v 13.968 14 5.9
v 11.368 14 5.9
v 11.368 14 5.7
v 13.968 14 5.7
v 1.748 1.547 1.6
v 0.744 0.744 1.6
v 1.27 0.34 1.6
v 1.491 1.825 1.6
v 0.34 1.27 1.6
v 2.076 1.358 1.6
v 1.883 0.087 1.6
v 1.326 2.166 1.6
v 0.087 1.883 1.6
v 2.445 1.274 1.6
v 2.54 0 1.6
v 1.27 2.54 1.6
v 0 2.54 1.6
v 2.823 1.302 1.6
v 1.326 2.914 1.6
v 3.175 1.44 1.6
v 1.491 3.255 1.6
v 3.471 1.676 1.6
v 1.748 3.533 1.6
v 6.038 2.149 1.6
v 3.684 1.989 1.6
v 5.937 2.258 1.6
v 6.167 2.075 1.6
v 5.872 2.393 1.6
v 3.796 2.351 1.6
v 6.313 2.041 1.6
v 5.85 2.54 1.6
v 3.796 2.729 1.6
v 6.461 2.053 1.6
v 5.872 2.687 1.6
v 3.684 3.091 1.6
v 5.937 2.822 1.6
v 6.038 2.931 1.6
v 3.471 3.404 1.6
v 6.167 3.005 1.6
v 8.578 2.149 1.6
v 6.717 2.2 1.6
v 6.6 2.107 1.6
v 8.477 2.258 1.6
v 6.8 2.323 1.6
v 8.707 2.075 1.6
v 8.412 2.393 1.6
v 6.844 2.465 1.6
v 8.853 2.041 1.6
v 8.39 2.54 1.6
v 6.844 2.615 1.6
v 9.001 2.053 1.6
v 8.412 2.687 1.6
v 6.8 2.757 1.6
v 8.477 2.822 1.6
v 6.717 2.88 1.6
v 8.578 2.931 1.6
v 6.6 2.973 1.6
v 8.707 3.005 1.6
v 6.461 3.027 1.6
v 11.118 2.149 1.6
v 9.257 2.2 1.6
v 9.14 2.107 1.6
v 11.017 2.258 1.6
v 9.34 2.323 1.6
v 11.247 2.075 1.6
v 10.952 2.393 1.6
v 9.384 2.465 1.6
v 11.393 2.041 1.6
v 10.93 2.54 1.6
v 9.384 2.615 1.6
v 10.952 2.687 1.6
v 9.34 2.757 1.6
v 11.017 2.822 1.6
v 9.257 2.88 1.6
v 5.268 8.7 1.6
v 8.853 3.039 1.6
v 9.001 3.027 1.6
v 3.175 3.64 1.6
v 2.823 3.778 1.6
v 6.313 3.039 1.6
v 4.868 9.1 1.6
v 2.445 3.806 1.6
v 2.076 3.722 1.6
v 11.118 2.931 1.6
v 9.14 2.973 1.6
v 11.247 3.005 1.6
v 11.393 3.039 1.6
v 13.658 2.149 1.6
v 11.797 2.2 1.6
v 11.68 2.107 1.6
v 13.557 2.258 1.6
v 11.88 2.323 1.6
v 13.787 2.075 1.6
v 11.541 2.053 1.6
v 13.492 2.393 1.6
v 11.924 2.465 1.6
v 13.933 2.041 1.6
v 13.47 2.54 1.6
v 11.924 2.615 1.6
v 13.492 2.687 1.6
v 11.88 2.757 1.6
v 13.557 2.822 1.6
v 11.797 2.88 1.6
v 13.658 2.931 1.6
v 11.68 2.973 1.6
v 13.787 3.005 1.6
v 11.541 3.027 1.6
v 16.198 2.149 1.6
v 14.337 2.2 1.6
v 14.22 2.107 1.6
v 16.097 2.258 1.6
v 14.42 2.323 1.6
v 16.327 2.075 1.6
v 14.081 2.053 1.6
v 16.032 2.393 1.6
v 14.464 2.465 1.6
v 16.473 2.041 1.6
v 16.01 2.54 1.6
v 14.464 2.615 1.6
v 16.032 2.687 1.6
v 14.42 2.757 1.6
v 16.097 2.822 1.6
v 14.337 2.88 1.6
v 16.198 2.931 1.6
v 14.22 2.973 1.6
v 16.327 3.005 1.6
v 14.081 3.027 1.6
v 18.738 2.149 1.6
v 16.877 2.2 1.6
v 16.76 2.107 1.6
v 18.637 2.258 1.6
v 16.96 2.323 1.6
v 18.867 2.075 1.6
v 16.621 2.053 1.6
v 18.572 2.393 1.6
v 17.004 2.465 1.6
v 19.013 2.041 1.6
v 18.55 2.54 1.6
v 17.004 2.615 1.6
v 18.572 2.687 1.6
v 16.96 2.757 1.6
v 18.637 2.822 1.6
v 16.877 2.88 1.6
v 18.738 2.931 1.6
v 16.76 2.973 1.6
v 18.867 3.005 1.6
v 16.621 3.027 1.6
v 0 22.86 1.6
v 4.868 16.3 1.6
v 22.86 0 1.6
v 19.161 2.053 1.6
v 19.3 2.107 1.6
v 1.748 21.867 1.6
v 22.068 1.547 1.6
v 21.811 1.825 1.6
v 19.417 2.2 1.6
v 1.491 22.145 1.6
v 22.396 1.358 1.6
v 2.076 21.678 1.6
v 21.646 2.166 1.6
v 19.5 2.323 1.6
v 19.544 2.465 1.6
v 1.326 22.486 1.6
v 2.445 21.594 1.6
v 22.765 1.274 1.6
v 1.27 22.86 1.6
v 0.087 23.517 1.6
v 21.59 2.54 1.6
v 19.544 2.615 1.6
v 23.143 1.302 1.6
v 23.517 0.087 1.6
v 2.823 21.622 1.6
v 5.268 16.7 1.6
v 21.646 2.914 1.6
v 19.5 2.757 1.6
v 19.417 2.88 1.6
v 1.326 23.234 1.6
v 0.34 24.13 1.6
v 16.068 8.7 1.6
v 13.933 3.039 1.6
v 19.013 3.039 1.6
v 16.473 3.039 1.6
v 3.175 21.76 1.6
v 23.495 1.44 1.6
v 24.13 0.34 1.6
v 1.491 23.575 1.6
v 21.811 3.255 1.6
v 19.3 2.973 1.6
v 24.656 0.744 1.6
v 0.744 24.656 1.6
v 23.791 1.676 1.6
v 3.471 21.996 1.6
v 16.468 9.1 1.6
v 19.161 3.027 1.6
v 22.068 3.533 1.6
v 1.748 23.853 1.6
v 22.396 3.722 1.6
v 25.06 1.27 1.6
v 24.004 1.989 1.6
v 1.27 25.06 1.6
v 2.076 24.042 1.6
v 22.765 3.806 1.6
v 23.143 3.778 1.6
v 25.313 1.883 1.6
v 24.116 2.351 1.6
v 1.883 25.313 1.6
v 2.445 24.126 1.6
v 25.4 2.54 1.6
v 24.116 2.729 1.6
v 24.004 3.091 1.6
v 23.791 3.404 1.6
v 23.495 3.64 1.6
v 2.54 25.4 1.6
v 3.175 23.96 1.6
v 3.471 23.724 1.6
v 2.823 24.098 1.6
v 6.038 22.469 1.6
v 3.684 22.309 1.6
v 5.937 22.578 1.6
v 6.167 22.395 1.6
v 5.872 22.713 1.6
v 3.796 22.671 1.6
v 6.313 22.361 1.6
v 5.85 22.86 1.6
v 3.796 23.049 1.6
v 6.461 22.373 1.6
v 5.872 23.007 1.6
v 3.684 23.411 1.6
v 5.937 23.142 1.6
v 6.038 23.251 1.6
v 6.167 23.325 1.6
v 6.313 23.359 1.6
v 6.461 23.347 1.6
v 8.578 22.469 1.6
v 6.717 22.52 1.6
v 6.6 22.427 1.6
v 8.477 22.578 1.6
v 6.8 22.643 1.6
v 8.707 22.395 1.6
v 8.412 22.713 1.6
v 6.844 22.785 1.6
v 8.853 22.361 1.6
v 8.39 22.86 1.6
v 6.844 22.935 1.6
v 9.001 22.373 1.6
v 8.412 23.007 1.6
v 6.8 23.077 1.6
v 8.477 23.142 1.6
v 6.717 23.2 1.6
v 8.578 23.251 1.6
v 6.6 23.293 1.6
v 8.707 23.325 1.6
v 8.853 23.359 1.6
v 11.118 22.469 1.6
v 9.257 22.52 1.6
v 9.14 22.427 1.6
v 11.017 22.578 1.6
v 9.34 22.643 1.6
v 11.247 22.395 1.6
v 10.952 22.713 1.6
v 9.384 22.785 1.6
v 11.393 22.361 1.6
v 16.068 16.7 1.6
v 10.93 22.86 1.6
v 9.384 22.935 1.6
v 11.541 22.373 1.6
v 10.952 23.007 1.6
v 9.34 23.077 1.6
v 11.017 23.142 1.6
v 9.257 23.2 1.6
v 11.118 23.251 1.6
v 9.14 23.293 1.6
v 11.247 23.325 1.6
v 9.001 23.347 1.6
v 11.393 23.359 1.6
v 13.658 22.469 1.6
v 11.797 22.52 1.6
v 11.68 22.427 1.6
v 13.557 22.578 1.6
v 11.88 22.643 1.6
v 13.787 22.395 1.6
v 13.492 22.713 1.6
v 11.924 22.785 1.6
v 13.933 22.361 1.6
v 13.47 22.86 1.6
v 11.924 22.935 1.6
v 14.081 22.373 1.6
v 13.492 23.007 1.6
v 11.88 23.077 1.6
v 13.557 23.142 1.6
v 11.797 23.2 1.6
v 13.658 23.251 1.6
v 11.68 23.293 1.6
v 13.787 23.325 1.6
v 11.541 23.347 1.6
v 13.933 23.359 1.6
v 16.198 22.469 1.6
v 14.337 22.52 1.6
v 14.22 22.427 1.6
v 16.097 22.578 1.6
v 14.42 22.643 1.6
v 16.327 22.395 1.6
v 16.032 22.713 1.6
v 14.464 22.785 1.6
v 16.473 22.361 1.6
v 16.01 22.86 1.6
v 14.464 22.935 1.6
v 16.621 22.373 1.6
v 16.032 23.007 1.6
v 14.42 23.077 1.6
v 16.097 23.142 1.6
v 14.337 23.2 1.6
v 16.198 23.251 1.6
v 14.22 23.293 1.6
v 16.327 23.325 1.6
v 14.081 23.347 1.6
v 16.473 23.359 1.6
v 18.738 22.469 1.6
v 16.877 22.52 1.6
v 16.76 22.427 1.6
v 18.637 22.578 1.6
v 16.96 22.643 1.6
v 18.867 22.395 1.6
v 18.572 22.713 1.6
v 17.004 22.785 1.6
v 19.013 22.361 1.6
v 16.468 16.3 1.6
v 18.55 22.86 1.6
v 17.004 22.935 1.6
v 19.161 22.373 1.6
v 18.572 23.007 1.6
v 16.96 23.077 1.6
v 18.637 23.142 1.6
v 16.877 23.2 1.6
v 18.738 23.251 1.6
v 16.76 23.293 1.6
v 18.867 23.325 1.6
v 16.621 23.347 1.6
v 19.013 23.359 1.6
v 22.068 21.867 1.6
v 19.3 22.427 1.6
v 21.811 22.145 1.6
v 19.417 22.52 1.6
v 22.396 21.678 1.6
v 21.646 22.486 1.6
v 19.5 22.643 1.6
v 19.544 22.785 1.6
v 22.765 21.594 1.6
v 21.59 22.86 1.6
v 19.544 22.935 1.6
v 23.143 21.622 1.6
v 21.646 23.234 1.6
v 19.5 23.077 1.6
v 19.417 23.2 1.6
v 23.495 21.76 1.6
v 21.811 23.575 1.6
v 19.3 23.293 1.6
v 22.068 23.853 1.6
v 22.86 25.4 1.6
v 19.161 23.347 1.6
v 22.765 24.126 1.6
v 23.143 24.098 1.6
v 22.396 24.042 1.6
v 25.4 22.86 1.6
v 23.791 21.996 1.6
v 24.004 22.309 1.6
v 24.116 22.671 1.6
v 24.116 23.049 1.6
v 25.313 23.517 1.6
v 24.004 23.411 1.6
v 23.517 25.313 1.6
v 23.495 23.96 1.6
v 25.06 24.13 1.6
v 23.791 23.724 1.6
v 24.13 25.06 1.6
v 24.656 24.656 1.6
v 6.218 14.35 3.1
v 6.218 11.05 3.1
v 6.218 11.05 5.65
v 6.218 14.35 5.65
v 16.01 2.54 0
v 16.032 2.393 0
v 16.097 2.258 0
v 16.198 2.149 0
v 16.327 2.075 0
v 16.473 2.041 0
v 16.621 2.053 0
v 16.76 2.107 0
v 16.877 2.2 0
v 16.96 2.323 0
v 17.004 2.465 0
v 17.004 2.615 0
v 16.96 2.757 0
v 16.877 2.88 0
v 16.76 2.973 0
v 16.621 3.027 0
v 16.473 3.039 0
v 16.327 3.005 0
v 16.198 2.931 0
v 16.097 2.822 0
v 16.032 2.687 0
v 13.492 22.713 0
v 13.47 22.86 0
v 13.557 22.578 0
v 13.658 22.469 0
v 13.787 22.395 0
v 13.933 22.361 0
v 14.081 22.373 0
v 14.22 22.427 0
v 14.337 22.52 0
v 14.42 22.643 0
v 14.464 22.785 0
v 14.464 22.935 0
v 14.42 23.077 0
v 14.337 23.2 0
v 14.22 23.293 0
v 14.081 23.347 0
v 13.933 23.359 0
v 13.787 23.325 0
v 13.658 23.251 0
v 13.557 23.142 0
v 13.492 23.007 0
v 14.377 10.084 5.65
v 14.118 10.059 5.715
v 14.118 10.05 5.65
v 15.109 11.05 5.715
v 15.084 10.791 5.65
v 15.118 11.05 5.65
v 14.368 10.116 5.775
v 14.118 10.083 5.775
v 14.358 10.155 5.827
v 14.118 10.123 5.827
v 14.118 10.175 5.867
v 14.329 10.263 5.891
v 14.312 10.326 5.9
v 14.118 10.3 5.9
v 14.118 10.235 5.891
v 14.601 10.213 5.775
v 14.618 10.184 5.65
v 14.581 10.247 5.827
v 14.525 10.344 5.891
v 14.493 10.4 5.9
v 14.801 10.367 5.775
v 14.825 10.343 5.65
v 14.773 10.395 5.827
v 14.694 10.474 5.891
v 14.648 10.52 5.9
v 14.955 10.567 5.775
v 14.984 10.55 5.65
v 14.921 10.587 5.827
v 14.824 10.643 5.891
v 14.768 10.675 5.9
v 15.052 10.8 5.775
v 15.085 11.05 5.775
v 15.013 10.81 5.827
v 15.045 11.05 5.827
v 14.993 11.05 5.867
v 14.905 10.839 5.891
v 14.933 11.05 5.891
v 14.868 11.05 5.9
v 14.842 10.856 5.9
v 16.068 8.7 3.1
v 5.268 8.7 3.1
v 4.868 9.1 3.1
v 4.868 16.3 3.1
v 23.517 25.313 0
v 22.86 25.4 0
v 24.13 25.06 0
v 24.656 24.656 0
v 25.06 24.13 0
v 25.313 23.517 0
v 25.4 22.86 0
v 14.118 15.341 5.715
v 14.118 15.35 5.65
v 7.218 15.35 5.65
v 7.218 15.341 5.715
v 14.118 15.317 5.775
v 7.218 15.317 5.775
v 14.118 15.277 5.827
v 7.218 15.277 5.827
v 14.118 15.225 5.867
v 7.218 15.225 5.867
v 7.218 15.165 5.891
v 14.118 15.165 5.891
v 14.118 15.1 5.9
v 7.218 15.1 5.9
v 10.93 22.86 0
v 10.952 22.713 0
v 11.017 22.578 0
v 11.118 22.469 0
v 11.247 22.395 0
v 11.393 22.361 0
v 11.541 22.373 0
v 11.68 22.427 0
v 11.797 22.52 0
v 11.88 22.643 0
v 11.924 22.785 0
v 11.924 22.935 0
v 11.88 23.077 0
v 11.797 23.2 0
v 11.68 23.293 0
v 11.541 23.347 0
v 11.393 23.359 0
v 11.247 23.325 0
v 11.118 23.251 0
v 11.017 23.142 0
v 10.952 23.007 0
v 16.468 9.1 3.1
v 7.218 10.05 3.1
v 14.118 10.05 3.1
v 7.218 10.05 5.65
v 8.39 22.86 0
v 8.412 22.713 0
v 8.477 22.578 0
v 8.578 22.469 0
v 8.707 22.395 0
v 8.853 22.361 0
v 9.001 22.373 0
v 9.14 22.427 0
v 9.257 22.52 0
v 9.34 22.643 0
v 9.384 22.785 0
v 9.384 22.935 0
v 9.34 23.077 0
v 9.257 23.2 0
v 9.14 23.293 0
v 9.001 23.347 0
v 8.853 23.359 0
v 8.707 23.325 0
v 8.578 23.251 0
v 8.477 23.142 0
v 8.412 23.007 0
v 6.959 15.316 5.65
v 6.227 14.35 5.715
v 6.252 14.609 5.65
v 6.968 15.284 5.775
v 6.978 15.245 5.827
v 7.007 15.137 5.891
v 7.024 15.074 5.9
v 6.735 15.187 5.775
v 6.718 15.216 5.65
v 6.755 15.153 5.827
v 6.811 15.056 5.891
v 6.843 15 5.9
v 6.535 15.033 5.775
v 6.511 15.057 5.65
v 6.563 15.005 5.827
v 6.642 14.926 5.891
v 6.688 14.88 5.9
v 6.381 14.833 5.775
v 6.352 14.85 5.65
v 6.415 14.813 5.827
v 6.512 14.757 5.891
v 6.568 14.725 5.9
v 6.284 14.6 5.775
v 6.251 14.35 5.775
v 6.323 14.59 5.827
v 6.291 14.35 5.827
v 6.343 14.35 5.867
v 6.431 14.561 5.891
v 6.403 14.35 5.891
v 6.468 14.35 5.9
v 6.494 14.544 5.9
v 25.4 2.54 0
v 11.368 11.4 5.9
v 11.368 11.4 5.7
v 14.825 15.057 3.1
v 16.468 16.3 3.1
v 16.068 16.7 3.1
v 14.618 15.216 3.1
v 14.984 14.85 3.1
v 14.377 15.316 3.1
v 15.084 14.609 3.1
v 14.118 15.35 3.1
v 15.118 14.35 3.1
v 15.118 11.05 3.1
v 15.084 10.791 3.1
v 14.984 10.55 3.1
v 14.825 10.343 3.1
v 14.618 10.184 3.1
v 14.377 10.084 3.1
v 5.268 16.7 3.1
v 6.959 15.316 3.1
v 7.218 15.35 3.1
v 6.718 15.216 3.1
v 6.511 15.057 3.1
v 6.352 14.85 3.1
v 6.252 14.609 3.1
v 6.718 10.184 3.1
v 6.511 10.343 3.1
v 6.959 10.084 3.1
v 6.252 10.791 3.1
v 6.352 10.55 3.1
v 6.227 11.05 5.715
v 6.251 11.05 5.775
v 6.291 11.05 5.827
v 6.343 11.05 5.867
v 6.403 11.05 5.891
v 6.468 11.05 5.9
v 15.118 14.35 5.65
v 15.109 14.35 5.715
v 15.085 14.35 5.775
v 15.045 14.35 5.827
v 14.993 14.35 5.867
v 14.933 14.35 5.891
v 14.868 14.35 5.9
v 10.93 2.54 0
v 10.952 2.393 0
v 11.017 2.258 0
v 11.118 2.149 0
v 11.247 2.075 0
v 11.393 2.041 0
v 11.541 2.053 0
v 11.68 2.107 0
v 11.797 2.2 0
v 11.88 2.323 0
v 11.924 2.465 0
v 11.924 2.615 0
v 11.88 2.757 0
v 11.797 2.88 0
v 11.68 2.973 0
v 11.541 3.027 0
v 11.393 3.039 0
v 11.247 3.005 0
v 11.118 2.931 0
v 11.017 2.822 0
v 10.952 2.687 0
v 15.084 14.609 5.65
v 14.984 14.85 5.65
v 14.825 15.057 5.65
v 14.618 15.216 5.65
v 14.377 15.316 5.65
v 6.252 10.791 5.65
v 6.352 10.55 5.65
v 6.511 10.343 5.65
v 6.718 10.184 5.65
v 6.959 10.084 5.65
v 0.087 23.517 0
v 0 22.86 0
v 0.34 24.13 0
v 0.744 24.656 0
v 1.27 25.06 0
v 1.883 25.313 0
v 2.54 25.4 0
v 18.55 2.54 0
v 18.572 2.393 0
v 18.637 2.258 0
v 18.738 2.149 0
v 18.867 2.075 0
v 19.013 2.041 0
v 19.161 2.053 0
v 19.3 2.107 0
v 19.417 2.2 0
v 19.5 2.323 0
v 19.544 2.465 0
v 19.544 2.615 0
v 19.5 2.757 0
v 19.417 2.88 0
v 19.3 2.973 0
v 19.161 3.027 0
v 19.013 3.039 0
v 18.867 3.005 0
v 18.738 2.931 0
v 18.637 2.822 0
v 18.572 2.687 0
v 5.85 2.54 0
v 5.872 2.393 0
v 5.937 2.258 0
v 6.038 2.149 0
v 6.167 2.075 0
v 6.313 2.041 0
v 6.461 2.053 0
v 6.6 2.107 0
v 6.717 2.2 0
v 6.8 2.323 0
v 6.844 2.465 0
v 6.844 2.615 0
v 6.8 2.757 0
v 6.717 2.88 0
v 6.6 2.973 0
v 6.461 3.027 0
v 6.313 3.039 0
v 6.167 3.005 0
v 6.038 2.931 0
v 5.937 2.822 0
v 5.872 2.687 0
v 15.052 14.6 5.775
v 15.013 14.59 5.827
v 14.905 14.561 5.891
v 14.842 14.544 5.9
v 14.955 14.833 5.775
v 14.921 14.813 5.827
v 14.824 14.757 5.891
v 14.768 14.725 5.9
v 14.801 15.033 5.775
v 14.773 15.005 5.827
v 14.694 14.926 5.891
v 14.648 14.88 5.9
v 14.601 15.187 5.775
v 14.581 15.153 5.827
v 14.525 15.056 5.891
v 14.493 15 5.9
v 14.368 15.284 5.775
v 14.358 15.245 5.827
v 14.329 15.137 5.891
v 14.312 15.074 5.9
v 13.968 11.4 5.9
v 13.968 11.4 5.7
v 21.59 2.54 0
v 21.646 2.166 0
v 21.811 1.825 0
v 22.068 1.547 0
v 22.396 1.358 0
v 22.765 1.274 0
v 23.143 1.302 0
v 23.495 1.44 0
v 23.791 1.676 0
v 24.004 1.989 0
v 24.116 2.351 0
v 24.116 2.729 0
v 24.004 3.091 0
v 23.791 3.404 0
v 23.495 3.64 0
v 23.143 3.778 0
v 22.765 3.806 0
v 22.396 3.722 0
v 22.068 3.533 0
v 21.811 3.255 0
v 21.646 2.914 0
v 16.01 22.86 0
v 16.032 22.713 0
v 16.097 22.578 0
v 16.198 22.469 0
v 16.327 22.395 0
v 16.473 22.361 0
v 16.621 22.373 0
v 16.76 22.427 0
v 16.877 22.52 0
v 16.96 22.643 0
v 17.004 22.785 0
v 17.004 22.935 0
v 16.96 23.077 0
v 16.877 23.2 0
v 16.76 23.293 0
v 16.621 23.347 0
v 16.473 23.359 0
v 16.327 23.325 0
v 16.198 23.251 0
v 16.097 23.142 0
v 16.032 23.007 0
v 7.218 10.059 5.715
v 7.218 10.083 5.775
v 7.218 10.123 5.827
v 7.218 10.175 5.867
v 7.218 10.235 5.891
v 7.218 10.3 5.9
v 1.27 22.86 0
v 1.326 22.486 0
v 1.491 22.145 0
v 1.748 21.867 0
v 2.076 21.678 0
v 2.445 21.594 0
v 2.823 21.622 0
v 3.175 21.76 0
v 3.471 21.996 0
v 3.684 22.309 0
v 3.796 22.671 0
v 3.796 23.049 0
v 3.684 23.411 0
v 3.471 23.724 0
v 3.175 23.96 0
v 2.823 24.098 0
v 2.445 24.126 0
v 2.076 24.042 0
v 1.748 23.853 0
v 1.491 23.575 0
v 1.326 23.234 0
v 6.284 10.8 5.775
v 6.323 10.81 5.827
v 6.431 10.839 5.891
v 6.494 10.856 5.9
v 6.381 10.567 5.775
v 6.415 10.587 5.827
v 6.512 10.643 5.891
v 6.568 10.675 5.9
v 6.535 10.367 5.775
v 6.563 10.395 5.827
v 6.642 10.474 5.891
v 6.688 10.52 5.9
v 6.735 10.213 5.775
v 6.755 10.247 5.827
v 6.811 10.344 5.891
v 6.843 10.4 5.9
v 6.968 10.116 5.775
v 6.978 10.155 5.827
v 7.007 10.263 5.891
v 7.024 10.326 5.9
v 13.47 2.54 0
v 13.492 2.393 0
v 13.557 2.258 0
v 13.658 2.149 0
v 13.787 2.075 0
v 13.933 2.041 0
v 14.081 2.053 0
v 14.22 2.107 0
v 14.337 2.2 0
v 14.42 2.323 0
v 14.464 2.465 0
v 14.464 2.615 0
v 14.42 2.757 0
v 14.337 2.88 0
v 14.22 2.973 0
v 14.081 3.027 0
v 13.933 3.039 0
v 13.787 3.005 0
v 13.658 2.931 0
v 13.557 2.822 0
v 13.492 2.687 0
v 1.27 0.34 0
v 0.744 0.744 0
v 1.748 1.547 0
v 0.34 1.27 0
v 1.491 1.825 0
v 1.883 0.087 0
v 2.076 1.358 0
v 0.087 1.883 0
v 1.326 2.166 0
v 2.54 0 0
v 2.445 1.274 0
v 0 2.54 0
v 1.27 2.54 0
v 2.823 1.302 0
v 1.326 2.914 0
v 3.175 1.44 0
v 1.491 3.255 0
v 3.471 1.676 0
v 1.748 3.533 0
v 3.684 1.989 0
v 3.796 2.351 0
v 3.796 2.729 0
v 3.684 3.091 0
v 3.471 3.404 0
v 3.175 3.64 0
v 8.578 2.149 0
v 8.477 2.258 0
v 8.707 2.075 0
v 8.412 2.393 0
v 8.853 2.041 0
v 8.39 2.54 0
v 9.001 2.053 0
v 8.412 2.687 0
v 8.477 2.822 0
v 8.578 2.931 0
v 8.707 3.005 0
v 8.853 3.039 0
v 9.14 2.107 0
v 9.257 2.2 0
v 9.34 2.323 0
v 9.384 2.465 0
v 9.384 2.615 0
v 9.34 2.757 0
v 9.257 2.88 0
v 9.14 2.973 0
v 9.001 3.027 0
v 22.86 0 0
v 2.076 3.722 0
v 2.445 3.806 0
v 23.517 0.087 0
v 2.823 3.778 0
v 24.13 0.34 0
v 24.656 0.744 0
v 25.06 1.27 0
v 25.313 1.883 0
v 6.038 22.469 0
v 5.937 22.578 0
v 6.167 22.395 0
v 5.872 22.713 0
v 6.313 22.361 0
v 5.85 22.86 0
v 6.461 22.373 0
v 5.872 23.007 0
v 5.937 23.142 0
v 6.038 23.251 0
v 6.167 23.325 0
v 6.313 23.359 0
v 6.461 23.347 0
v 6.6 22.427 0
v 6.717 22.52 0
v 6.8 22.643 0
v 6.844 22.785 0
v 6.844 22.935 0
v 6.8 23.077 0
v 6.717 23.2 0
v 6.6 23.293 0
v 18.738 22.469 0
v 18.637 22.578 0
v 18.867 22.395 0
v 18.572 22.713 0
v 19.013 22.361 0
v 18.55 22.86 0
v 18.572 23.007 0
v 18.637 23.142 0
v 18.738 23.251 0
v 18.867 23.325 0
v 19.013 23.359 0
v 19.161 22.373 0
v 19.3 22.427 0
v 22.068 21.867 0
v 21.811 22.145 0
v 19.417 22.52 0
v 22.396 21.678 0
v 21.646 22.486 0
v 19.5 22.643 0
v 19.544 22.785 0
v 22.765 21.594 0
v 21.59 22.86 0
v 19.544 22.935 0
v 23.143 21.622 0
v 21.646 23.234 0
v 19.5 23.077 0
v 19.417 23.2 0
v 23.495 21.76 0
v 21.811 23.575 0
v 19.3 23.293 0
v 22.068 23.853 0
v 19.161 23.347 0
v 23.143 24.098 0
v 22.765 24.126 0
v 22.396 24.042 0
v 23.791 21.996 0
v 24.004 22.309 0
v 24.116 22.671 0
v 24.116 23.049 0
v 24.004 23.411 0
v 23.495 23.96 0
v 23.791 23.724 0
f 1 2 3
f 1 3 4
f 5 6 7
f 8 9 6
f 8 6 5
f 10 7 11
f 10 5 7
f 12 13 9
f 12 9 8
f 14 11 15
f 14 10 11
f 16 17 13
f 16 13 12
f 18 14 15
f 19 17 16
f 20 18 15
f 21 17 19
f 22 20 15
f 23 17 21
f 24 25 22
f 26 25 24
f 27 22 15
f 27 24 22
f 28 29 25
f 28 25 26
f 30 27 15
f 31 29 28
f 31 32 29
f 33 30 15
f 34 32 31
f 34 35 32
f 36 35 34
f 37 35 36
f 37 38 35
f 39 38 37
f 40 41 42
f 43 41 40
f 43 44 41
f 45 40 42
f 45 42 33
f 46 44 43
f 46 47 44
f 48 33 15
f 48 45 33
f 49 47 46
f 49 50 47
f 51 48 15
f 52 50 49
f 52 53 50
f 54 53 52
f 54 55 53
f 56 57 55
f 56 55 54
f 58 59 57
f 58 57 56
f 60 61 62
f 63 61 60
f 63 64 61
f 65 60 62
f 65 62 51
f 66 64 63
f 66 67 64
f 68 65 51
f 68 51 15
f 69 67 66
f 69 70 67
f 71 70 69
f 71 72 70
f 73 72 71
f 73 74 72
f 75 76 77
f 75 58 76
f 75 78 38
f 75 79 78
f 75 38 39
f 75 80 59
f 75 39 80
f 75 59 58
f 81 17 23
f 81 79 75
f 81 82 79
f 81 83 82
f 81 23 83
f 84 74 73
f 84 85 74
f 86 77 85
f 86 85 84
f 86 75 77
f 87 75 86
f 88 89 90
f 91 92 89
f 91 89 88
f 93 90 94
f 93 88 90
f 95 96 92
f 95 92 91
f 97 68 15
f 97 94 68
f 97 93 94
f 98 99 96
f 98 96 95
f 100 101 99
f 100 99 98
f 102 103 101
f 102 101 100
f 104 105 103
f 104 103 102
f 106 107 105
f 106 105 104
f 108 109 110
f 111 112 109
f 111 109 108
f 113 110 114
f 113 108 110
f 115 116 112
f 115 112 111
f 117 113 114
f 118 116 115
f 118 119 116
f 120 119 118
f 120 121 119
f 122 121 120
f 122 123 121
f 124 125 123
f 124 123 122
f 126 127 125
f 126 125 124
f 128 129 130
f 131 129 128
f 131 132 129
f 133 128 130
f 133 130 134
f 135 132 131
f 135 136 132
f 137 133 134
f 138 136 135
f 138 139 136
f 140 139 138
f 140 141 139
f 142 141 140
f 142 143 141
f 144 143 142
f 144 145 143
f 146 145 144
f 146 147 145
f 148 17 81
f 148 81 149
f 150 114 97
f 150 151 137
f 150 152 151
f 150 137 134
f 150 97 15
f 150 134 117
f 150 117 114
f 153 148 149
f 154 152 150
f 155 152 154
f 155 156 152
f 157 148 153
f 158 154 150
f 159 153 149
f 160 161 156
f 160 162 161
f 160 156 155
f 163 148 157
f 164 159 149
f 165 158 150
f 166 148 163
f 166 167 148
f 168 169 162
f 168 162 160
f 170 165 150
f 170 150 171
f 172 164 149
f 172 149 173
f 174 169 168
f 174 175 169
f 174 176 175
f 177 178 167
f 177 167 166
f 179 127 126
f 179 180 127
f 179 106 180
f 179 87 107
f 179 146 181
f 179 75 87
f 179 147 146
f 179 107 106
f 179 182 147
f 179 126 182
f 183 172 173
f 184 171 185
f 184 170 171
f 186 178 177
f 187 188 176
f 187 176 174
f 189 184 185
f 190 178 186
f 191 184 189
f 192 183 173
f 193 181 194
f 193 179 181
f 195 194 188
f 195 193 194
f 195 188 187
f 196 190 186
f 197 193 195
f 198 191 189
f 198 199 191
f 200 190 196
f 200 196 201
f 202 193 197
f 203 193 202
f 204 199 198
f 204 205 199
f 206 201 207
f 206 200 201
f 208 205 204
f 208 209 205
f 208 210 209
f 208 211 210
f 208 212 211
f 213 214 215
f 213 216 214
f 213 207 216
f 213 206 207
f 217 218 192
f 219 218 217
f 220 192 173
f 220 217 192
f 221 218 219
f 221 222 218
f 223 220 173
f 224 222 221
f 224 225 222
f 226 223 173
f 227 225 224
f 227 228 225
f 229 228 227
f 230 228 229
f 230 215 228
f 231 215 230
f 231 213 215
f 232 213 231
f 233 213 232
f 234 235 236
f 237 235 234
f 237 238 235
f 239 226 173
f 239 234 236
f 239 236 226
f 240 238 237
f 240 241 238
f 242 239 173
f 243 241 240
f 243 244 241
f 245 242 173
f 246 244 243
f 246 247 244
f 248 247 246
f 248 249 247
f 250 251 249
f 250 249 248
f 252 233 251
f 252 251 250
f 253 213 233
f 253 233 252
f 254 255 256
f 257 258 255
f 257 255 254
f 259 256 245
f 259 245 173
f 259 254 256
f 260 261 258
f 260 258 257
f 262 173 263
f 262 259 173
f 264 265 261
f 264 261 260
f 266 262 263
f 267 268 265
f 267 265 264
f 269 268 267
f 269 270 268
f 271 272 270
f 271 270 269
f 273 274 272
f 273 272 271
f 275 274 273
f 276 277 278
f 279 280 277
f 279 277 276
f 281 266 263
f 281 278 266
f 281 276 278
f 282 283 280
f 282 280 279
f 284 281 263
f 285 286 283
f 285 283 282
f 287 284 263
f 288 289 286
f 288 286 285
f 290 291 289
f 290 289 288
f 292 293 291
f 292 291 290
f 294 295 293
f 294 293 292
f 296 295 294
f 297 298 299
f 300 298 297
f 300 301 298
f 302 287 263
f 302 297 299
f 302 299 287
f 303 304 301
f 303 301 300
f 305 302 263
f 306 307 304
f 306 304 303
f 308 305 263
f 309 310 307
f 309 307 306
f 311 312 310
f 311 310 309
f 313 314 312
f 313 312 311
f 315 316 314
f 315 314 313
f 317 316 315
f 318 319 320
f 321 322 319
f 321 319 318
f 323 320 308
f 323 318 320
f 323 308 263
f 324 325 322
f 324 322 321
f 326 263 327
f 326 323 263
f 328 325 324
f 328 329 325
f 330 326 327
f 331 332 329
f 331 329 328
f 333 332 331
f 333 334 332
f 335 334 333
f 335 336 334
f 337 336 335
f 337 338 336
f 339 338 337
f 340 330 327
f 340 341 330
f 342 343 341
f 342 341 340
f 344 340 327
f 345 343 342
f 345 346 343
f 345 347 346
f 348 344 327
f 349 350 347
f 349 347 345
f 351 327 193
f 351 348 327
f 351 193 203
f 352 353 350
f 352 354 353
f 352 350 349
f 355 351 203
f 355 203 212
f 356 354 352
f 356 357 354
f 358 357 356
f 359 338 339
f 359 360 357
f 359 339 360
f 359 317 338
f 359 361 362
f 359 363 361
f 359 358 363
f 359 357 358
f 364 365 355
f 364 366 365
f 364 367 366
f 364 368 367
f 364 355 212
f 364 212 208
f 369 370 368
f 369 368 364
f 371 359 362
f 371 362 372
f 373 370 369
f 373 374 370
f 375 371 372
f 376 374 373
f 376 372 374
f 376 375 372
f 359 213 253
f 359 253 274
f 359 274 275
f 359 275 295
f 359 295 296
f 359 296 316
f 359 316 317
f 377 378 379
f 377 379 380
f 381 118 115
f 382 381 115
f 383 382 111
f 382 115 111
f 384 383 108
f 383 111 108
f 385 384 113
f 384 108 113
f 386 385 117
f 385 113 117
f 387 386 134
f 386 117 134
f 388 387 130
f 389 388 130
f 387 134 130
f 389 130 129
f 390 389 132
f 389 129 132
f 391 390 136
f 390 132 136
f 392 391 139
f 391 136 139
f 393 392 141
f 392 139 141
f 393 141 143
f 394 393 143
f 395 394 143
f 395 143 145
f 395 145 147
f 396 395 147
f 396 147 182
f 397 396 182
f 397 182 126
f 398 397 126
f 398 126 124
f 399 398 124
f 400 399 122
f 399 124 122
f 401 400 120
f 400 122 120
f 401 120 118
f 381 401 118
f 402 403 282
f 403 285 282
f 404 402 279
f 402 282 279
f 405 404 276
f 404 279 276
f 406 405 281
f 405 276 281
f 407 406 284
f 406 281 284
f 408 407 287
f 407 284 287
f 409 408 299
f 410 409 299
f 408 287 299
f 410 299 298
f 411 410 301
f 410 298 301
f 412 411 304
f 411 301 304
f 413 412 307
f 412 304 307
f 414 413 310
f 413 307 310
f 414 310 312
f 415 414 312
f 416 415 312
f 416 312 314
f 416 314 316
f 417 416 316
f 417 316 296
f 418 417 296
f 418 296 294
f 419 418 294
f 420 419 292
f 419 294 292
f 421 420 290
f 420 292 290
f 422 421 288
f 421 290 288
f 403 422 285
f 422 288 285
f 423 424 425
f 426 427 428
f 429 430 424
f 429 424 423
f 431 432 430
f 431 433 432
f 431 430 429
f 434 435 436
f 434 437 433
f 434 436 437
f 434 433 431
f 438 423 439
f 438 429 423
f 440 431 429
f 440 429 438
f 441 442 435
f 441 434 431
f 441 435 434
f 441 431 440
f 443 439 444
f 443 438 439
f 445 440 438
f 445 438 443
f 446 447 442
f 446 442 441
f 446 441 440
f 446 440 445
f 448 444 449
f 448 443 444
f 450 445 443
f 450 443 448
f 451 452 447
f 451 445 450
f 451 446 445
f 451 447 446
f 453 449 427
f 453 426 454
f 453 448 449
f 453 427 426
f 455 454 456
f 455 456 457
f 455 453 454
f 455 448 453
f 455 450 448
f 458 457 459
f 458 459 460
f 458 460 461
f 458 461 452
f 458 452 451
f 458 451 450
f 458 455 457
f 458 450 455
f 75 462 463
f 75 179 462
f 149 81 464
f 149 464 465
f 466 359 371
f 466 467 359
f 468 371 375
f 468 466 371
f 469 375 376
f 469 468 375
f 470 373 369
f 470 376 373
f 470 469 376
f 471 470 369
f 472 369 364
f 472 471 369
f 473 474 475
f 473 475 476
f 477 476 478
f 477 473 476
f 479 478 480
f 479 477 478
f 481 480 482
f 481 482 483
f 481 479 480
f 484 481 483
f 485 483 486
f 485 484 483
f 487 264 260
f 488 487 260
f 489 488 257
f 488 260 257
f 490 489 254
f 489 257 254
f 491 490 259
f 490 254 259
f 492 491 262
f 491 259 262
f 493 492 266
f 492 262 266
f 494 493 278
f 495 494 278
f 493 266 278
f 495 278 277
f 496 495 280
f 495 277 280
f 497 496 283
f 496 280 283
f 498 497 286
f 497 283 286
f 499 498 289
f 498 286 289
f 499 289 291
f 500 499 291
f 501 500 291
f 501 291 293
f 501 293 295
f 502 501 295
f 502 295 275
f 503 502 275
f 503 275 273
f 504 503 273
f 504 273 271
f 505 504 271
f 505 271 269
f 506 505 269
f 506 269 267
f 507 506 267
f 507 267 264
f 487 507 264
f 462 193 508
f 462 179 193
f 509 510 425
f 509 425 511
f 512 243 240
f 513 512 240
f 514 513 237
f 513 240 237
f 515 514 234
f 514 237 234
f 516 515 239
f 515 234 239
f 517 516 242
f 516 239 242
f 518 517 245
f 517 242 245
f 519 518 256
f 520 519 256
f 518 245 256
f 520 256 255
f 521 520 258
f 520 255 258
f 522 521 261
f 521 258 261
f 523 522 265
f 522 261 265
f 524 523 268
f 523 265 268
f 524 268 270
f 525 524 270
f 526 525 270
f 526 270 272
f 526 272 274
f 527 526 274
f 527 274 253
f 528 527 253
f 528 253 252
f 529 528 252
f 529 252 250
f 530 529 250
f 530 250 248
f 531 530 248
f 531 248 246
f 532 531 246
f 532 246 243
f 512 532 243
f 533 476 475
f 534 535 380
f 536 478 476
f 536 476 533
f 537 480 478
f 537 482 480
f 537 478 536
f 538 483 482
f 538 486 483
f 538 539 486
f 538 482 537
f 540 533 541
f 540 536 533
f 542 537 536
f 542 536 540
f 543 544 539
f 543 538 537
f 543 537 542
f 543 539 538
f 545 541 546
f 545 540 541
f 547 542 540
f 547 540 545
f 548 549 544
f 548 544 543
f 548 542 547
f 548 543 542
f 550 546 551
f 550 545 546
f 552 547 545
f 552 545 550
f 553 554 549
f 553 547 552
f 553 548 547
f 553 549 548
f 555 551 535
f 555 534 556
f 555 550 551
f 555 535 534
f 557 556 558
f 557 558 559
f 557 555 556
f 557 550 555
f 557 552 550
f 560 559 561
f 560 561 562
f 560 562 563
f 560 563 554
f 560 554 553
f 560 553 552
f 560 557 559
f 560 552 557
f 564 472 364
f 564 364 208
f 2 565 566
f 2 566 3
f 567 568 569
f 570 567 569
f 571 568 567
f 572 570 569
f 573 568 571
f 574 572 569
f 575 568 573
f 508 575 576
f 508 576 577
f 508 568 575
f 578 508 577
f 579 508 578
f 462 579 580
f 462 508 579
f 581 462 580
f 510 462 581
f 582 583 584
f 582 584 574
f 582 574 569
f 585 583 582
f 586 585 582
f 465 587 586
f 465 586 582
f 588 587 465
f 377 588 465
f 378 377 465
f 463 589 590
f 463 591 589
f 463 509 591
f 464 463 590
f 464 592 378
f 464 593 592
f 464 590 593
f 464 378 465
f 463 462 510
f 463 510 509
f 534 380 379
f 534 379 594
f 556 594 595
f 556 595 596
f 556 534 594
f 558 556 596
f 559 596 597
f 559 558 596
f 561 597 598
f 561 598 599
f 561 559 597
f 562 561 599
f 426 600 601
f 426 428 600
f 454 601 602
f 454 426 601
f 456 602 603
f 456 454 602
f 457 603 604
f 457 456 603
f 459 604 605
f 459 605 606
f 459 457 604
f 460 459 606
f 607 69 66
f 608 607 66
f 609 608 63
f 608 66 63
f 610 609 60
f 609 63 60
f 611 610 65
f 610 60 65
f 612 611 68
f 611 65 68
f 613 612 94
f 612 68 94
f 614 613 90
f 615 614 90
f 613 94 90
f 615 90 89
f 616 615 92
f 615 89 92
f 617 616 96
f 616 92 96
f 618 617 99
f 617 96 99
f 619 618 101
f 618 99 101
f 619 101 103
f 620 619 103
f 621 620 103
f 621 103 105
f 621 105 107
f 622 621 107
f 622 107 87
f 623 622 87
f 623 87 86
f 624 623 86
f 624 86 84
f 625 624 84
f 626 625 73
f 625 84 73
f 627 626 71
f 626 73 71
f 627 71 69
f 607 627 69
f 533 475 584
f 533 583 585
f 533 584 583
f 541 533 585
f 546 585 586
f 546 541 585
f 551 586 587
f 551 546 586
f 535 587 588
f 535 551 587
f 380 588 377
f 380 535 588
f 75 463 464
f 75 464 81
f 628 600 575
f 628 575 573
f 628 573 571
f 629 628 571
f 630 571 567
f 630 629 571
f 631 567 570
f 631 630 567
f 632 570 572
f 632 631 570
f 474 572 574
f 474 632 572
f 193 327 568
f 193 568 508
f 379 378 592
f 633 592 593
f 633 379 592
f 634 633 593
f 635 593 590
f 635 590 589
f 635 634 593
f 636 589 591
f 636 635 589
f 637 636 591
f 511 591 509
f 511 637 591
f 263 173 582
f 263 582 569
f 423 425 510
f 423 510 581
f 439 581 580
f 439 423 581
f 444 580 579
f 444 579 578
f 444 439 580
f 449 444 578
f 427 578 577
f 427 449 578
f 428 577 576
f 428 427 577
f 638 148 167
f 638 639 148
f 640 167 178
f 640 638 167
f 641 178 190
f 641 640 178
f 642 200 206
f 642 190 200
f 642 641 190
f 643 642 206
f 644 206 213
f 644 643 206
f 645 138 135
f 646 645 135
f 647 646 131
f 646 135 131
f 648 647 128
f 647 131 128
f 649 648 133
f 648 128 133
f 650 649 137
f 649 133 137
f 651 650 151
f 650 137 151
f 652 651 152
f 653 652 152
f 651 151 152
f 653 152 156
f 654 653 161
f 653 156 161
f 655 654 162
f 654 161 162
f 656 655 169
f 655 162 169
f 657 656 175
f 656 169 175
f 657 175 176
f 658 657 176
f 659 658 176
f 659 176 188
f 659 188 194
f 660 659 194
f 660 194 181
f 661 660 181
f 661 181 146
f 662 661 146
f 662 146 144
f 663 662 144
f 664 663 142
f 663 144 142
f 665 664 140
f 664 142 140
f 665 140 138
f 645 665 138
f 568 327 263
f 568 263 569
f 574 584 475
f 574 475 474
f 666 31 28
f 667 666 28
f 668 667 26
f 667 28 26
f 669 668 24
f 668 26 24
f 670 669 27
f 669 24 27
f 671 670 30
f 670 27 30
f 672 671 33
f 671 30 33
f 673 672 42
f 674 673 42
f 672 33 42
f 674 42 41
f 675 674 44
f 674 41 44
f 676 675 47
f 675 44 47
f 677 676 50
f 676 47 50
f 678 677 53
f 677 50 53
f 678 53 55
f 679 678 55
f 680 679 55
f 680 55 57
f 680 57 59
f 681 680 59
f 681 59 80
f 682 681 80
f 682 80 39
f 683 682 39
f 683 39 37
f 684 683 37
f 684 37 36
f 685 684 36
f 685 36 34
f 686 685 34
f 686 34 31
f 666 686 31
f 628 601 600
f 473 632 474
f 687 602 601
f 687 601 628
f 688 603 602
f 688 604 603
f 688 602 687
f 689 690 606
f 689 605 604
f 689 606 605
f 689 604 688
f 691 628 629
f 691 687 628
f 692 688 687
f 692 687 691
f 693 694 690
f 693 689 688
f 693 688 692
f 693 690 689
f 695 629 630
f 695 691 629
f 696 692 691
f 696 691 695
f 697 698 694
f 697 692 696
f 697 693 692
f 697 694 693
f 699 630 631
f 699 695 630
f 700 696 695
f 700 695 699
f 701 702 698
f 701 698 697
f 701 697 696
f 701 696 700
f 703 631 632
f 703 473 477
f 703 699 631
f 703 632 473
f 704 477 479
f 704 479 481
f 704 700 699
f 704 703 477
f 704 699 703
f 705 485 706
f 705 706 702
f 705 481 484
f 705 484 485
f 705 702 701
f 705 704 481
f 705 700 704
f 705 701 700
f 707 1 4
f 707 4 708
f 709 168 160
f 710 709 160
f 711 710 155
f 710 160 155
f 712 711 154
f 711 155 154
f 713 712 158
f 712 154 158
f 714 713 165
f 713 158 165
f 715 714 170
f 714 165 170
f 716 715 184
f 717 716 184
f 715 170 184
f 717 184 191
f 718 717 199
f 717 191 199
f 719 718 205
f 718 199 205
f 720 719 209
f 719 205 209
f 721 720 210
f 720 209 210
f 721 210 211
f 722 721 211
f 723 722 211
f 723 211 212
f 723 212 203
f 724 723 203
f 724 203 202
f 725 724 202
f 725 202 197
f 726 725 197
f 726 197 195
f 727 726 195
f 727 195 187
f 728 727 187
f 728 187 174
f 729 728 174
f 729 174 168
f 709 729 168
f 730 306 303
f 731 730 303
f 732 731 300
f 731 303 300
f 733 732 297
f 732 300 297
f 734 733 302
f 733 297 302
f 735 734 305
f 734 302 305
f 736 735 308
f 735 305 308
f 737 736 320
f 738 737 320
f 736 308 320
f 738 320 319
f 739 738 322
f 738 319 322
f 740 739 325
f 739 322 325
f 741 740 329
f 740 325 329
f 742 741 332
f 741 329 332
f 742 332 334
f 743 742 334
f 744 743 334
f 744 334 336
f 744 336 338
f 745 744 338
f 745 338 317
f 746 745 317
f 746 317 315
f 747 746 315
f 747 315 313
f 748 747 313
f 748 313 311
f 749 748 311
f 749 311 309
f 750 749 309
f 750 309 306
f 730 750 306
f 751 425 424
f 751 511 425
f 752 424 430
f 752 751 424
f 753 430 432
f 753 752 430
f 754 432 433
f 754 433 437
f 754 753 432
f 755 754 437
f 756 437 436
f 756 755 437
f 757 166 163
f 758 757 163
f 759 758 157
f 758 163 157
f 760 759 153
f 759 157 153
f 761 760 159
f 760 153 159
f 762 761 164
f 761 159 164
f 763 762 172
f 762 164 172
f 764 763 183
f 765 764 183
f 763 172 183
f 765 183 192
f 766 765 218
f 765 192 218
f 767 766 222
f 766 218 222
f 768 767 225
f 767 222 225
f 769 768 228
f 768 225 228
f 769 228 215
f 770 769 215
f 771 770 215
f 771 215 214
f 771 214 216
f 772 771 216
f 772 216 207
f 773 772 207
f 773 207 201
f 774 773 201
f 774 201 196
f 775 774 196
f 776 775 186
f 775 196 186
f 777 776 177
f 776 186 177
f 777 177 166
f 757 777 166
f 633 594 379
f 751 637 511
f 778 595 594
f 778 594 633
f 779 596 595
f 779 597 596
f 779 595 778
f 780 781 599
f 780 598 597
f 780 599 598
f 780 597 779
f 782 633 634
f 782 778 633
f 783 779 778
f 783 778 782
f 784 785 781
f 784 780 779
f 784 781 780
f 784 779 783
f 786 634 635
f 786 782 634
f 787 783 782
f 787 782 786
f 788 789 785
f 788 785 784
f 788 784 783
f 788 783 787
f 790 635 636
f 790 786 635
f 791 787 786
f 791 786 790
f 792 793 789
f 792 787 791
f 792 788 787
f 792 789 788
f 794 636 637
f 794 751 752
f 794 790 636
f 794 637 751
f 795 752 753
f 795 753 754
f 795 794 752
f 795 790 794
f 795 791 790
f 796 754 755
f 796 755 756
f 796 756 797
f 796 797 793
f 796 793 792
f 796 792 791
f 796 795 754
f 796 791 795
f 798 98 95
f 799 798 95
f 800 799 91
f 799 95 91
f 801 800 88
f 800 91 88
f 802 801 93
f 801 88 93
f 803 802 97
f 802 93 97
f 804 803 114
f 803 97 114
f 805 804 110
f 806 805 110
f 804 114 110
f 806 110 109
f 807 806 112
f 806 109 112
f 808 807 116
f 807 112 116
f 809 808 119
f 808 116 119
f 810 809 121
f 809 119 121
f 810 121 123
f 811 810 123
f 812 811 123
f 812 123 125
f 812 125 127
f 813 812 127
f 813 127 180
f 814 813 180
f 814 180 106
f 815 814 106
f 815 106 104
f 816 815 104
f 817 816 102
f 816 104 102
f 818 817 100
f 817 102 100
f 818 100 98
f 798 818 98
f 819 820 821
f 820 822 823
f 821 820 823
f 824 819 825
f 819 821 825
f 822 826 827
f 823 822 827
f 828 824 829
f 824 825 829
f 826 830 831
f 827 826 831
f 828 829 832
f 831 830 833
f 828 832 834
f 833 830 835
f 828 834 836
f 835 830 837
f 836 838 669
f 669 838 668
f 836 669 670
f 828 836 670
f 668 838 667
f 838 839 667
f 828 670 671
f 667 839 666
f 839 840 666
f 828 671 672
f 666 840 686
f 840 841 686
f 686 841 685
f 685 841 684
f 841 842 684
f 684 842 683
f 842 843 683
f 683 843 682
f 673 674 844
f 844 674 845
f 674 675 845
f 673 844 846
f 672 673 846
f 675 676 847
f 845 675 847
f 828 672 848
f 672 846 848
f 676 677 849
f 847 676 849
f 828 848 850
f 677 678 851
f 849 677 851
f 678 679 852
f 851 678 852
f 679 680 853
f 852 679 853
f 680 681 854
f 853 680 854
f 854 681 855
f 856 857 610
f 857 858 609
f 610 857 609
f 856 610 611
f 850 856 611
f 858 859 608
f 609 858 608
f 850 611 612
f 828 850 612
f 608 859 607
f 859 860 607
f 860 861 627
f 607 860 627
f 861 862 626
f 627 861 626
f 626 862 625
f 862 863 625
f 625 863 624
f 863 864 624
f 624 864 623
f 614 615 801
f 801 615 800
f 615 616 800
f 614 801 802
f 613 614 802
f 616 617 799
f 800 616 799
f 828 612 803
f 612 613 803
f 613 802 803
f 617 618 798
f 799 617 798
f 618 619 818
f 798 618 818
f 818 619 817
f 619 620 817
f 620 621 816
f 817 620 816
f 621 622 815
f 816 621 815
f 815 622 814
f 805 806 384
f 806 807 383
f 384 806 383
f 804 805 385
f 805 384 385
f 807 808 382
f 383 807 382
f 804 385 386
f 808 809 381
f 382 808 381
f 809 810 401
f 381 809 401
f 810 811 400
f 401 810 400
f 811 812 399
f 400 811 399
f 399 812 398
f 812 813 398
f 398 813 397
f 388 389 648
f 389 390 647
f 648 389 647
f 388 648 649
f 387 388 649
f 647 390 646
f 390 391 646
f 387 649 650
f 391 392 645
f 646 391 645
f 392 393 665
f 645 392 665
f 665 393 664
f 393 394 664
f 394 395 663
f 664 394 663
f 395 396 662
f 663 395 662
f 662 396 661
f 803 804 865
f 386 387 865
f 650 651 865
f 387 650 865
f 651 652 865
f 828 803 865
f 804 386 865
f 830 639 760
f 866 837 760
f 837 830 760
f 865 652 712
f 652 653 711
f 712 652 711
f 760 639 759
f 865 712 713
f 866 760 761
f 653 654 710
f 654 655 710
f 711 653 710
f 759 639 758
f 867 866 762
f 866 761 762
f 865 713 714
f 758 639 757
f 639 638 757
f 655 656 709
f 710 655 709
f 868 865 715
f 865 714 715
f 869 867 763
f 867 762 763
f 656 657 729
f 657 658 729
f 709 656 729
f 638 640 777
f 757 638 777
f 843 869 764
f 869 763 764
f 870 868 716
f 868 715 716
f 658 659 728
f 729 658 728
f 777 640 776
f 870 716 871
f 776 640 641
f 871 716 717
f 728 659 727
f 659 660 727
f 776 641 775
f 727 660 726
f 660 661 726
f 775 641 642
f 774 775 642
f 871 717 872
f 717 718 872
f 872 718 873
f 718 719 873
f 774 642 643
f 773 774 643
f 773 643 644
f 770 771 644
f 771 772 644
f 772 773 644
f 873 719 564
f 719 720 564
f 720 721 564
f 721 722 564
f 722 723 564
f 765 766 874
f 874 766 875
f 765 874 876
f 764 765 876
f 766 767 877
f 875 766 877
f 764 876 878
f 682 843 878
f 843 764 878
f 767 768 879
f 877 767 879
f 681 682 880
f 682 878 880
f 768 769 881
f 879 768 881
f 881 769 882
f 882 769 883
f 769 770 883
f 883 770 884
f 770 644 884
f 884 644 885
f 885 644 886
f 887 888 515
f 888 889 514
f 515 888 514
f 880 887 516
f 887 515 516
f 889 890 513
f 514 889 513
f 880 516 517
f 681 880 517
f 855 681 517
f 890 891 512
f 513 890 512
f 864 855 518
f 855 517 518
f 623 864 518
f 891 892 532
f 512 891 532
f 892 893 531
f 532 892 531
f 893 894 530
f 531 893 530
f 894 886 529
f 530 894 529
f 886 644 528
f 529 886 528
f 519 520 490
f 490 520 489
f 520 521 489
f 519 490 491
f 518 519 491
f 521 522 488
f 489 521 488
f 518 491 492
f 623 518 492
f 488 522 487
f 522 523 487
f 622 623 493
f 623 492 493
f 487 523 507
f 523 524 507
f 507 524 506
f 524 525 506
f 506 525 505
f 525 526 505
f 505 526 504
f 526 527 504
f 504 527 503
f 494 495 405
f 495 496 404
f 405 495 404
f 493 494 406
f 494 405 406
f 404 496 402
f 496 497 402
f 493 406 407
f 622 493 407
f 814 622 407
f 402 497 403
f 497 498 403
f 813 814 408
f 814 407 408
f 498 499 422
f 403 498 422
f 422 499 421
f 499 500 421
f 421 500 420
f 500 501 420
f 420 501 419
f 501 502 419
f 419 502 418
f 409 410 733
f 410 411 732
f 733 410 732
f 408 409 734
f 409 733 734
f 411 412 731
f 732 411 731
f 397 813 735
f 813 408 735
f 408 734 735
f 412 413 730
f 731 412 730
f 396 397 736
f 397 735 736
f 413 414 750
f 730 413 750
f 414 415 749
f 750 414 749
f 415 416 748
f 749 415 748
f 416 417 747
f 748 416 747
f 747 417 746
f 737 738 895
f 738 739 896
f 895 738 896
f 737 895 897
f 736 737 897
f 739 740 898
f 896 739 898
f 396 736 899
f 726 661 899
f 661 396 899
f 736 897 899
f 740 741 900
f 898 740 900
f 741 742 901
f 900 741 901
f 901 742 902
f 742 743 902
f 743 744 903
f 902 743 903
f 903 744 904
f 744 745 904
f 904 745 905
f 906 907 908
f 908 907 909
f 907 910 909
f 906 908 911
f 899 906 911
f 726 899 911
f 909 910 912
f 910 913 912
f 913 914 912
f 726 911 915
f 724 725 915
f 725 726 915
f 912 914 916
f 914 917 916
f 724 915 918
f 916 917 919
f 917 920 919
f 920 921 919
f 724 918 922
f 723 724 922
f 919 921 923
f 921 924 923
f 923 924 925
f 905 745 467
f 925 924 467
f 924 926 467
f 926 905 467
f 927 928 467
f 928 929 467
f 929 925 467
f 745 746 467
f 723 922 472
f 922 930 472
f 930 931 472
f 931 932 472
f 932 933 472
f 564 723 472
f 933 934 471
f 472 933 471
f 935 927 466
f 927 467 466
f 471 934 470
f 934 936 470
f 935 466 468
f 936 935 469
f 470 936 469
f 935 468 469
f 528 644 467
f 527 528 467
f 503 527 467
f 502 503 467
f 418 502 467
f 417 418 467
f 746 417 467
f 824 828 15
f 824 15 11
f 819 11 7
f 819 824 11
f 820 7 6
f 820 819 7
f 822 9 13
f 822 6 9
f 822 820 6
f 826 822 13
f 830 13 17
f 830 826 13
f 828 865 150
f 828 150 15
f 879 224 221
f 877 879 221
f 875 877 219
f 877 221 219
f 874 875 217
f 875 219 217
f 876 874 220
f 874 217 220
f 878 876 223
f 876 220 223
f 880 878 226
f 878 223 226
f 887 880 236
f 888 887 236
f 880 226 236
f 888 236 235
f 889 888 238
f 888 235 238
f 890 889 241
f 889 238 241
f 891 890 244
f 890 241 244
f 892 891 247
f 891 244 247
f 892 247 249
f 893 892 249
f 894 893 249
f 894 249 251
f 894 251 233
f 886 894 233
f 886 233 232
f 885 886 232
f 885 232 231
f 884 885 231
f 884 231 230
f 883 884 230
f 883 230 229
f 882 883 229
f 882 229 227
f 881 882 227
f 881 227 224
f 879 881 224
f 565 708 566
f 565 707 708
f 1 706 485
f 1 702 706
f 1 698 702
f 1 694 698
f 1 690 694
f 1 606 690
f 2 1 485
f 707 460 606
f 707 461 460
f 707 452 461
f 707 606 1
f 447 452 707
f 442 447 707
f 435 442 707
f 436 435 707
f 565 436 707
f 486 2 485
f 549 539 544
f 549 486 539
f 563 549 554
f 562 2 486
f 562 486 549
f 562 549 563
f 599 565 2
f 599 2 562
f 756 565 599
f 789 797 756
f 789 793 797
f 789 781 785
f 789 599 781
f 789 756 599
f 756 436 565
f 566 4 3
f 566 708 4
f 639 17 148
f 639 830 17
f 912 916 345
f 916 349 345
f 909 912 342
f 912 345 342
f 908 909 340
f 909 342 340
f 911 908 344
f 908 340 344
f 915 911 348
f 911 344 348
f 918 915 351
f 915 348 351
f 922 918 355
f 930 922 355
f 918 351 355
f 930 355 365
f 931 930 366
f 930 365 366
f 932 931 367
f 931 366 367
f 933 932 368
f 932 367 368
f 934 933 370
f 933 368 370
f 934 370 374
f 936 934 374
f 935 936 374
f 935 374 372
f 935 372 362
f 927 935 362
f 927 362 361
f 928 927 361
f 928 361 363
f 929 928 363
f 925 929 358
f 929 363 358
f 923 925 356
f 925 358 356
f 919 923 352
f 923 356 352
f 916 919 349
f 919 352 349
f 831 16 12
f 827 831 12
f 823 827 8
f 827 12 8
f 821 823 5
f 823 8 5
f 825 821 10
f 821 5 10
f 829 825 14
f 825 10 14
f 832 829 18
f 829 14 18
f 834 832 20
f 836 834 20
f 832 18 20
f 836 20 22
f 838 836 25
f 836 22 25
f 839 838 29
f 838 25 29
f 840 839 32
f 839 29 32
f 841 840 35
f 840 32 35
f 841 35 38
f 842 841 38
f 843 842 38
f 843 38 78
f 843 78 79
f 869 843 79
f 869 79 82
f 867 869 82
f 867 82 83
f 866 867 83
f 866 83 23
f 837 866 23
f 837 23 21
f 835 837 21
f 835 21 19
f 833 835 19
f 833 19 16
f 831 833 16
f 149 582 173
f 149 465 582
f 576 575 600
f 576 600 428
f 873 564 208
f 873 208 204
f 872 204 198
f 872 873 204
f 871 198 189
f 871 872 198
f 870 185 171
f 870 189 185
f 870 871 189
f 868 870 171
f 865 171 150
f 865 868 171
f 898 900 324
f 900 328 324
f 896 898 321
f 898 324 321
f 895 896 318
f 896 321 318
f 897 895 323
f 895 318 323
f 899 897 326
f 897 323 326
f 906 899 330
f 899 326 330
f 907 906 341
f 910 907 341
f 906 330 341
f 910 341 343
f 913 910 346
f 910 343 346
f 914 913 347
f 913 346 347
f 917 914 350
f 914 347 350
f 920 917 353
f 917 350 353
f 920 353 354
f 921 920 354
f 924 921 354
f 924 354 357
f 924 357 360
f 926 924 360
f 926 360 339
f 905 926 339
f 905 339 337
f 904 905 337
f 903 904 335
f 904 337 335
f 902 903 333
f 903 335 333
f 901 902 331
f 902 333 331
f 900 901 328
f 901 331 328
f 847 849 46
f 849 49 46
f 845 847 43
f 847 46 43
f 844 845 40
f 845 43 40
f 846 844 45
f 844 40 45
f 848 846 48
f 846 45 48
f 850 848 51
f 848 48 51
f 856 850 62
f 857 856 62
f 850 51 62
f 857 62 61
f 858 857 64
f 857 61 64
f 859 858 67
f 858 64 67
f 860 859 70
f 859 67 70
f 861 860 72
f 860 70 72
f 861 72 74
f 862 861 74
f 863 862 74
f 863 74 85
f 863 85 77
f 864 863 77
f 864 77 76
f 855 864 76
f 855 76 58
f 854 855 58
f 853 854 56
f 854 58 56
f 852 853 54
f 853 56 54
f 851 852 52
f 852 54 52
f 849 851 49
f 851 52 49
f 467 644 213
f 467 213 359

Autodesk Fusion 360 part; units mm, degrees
sketch "AMG8833_REV-B" plane through (0, 0, 0) normal (0, 0, 1) x (1, 0, 0)
  arc A0 (2.54, 25.4) -> (0, 22.86) centre (2.54, 22.86) ccw
  line L0 (2.54, 25.4) -> (22.86, 25.4)
  line L1 (22.86, 0) -> (2.54, 0)
  arc A1 (0, 2.54) -> (2.54, 0) centre (2.54, 2.54) ccw
  line L2 (0, 2.54) -> (0, 22.86)
  arc A2 (22.86, 0) -> (25.4, 2.54) centre (22.86, 2.54) ccw
  arc A3 (25.4, 22.86) -> (22.86, 25.4) centre (22.86, 22.86) ccw
  line L3 (25.4, 22.86) -> (25.4, 2.54)
  circle A4 centre (2.54, 22.86) radius 1.758
  circle A5 centre (8.89, 2.54) radius 0.889
  circle A6 centre (2.54, 22.86) radius 1.758
  circle A7 centre (11.43, 2.54) radius 0.889
  circle A8 centre (22.86, 22.86) radius 1.758
  circle A9 centre (22.86, 2.54) radius 1.758
  circle A10 centre (6.35, 2.54) radius 0.889
  circle A11 centre (22.86, 2.54) radius 1.758
  circle A12 centre (11.43, 2.54) radius 0.889
  circle A13 centre (16.51, 22.86) radius 0.889
  circle A14 centre (13.97, 22.86) radius 0.889
  circle A15 centre (6.35, 22.86) radius 0.889
  circle A16 centre (6.35, 22.86) radius 0.889
  circle A17 centre (2.54, 2.54) radius 1.758
  circle A18 centre (19.05, 22.86) radius 0.889
  circle A19 centre (8.89, 22.86) radius 0.889
  circle A20 centre (11.43, 22.86) radius 0.889
  circle A21 centre (11.43, 22.86) radius 0.889
  circle A22 centre (13.97, 2.54) radius 0.889
  circle A23 centre (16.51, 2.54) radius 0.889
  circle A24 centre (16.51, 2.54) radius 0.889
  circle A25 centre (19.05, 22.86) radius 0.889
  circle A26 centre (16.51, 22.86) radius 0.889
  circle A27 centre (13.97, 22.86) radius 0.889
  circle A28 centre (8.89, 22.86) radius 0.889
  circle A29 centre (6.35, 2.54) radius 0.889
  circle A30 centre (19.05, 2.54) radius 0.889
  circle A31 centre (8.89, 2.54) radius 0.889
  circle A32 centre (13.97, 2.54) radius 0.889
  circle A33 centre (22.86, 22.86) radius 1.758
  circle A34 centre (2.54, 2.54) radius 1.758
  circle A35 centre (19.05, 2.54) radius 0.889
extrude "Extrude2" add sketch "AMG8833_REV-B" along normal blind 1.6
sketch "holes" plane through (0, 0, 1.6) normal (0, 0, 1) x (-1, 0, 0)
  circle A0 centre (-19.05, -2.54) radius 0.889
  circle A1 centre (-6.35, -22.86) radius 0.889
  circle A2 centre (-2.54, -2.54) radius 1.758
  circle A3 centre (-13.97, -22.86) radius 0.889
  circle A4 centre (-19.05, -22.86) radius 0.889
  circle A5 centre (-22.86, -2.54) radius 1.758
  circle A6 centre (-22.86, -22.86) radius 1.758
  circle A7 centre (-6.35, -2.54) radius 0.889
  circle A8 centre (-16.51, -2.54) radius 0.889
  circle A9 centre (-2.54, -22.86) radius 1.758
  circle A10 centre (-13.97, -2.54) radius 0.889
  circle A11 centre (-8.89, -2.54) radius 0.889
  circle A12 centre (-8.89, -22.86) radius 0.889
  circle A13 centre (-11.43, -22.86) radius 0.889
  circle A14 centre (-11.43, -2.54) radius 0.889
  circle A15 centre (-16.51, -22.86) radius 0.889
  arc A16 (-2.54, -25.4) -> (0, -22.86) centre (-2.54, -22.86) ccw
  line L0 (0, -22.86) -> (0, -2.54)
  arc A17 (0, -2.54) -> (-2.54, 0) centre (-2.54, -2.54) ccw
  line L1 (-2.54, 0) -> (-22.86, 0)
  arc A18 (-22.86, 0) -> (-25.4, -2.54) centre (-22.86, -2.54) ccw
  line L2 (-25.4, -2.54) -> (-25.4, -22.86)
  arc A19 (-25.4, -22.86) -> (-22.86, -25.4) centre (-22.86, -22.86) ccw
  line L3 (-22.86, -25.4) -> (-2.54, -25.4)
  circle A20 centre (-22.86, -22.86) radius 1.27
  circle A21 centre (-2.54, -22.86) radius 1.27
  circle A22 centre (-2.54, -2.54) radius 1.27
  circle A23 centre (-22.86, -2.54) radius 1.27
  circle A24 centre (-19.05, -2.54) radius 0.5
  circle A25 centre (-16.51, -2.54) radius 0.5
  circle A26 centre (-13.97, -2.54) radius 0.5
  circle A27 centre (-11.43, -2.54) radius 0.5
  circle A28 centre (-8.89, -2.54) radius 0.5
  circle A29 centre (-6.35, -2.54) radius 0.5
  circle A30 centre (-19.05, -22.86) radius 0.5
  circle A31 centre (-16.51, -22.86) radius 0.5
  circle A32 centre (-13.97, -22.86) radius 0.5
  circle A33 centre (-11.43, -22.86) radius 0.5
  circle A34 centre (-8.89, -22.86) radius 0.5
  circle A35 centre (-6.35, -22.86) radius 0.5
  dimension "d5" = 2.54
  dimension "d6" = 2.54
  dimension "d7" = 2.54
  dimension "d8" = 2.54
  dimension "d9" = 1
  dimension "d15" = 2.54
  dimension "d16" = 0
  dimension "d17" = 1
  dimension "d20" = 2.54
  dimension "d21" = 0
extrude "Extrude3" add sketch "holes" against normal blind 1.6 contours A0 | A1 | A2 | A3 | A4 | A5 | A6 | A7 | A8 | A9 | A10 | A11 | A12 | A13 | A14 | A15
sketch "lens base" plane through (0, 0, 1.6) normal (0, 0, 1) x (-1, 0, 0)
  circle A0 centre (-22.86, -2.54) radius 1.27
  circle A1 centre (-11.43, -2.54) radius 0.5
  circle A2 centre (-22.86, -22.86) radius 1.27
  circle A3 centre (-11.43, -22.86) radius 0.5
  circle A4 centre (-2.54, -22.86) radius 1.27
  circle A5 centre (-13.97, -22.86) radius 0.5
  circle A6 centre (-2.54, -2.54) radius 1.27
  circle A7 centre (-13.97, -2.54) radius 0.5
  circle A8 centre (-19.05, -2.54) radius 0.5
  circle A9 centre (-8.89, -2.54) radius 0.5
  circle A10 centre (-19.05, -22.86) radius 0.5
  circle A11 centre (-8.89, -22.86) radius 0.5
  circle A12 centre (-6.35, -22.86) radius 0.5
  circle A13 centre (-16.51, -22.86) radius 0.5
  circle A14 centre (-6.35, -2.54) radius 0.5
  circle A15 centre (-16.51, -2.54) radius 0.5
  arc A16 (-2.54, -25.4) -> (0, -22.86) centre (-2.54, -22.86) ccw
  line L0 (0, -22.86) -> (0, -2.54)
  arc A17 (0, -2.54) -> (-2.54, 0) centre (-2.54, -2.54) ccw
  line L1 (-2.54, 0) -> (-22.86, 0)
  arc A18 (-22.86, 0) -> (-25.4, -2.54) centre (-22.86, -2.54) ccw
  line L2 (-25.4, -2.54) -> (-25.4, -22.86)
  arc A19 (-25.4, -22.86) -> (-22.86, -25.4) centre (-22.86, -22.86) ccw
  line L3 (-22.86, -25.4) -> (-2.54, -25.4)
  line L4 (-4.868, -16.7) -> (-16.468, -16.7)
  line L5 (-16.468, -16.7) -> (-16.468, -8.7)
  line L6 (-16.468, -8.7) -> (-4.868, -8.7)
  line L7 (-4.868, -8.7) -> (-4.868, -16.7)
  line L8 (-10.668, -16.7) -> (-10.668, -8.7) construction
  line L9 (-16.468, -12.7) -> (-4.868, -12.7) construction
  dimension "d24" = 11.6
  dimension "d25" = 8
  dimension "d26" = 10.668
  dimension "d27" = 12.7
extrude "Extrude4" add sketch "lens base" along normal blind 1.5 contours L4 L5 L6 L7
sketch "lens" plane through (0, 0, 3.1) normal (0, 0, 1) x (-1, 0, 0)
  line L0 (-4.868, -8.7) -> (-16.468, -8.7)
  line L1 (-16.468, -8.7) -> (-16.468, -16.7)
  line L2 (-16.468, -16.7) -> (-4.868, -16.7)
  line L3 (-4.868, -16.7) -> (-4.868, -8.7)
  line L4 (-11.368, -14) -> (-13.968, -14)
  line L5 (-13.968, -14) -> (-13.968, -11.4)
  line L6 (-13.968, -11.4) -> (-11.368, -11.4)
  line L7 (-11.368, -11.4) -> (-11.368, -14)
  line L8 (-11.368, -12.7) -> (-13.968, -12.7) construction
  line L9 (-12.668, -14) -> (-12.668, -11.4) construction
  line L10 (-10.668, -16.7) -> (-10.668, -8.7) construction
  line L11 (-4.868, -12.7) -> (-16.468, -12.7) construction
  line L12 (-6.218, -15.35) -> (-15.118, -15.35)
  line L13 (-15.118, -15.35) -> (-15.118, -10.05)
  line L14 (-15.118, -10.05) -> (-6.218, -10.05)
  line L15 (-6.218, -10.05) -> (-6.218, -15.35)
  line L16 (-10.668, -15.35) -> (-10.668, -10.05) construction
  line L17 (-6.218, -12.7) -> (-15.118, -12.7) construction
  dimension "d30" = 2.6
  dimension "d31" = 2.6
  dimension "d32" = 2
  dimension "d33" = 8.9
  dimension "d34" = 5.3
extrude "Extrude5" add sketch "lens" along normal blind 2.8 contours L4 L5 L6 L7 | L12 L13 L14 L15
fillet "Fillet1" radius 1 4 edges at (6.218, 10.05, 4.5) (6.218, 15.35, 4.5) (15.118, 10.05, 4.5) (15.118, 15.35, 4.5)
fillet "Fillet2" radius 0.25 8 edges at (6.5109, 15.0571, 5.9) (6.218, 12.7, 5.9) (6.5109, 10.3429, 5.9) (10.668, 10.05, 5.9) (14.8251, 10.3429, 5.9) (15.118, 12.7, 5.9) (14.8251, 15.0571, 5.9) (10.668, 15.35, 5.9)
chamfer "Chamfer1" distance 0.4 angle 45 4 edges at (4.868, 16.7, 2.35) (4.868, 8.7, 2.35) (16.468, 16.7, 2.35) (16.468, 8.7, 2.35)
extrude "Extrude6" cut sketch "lens" against normal blind 0.2 from surface at 2.8 contours L4 L5 L6 L7
